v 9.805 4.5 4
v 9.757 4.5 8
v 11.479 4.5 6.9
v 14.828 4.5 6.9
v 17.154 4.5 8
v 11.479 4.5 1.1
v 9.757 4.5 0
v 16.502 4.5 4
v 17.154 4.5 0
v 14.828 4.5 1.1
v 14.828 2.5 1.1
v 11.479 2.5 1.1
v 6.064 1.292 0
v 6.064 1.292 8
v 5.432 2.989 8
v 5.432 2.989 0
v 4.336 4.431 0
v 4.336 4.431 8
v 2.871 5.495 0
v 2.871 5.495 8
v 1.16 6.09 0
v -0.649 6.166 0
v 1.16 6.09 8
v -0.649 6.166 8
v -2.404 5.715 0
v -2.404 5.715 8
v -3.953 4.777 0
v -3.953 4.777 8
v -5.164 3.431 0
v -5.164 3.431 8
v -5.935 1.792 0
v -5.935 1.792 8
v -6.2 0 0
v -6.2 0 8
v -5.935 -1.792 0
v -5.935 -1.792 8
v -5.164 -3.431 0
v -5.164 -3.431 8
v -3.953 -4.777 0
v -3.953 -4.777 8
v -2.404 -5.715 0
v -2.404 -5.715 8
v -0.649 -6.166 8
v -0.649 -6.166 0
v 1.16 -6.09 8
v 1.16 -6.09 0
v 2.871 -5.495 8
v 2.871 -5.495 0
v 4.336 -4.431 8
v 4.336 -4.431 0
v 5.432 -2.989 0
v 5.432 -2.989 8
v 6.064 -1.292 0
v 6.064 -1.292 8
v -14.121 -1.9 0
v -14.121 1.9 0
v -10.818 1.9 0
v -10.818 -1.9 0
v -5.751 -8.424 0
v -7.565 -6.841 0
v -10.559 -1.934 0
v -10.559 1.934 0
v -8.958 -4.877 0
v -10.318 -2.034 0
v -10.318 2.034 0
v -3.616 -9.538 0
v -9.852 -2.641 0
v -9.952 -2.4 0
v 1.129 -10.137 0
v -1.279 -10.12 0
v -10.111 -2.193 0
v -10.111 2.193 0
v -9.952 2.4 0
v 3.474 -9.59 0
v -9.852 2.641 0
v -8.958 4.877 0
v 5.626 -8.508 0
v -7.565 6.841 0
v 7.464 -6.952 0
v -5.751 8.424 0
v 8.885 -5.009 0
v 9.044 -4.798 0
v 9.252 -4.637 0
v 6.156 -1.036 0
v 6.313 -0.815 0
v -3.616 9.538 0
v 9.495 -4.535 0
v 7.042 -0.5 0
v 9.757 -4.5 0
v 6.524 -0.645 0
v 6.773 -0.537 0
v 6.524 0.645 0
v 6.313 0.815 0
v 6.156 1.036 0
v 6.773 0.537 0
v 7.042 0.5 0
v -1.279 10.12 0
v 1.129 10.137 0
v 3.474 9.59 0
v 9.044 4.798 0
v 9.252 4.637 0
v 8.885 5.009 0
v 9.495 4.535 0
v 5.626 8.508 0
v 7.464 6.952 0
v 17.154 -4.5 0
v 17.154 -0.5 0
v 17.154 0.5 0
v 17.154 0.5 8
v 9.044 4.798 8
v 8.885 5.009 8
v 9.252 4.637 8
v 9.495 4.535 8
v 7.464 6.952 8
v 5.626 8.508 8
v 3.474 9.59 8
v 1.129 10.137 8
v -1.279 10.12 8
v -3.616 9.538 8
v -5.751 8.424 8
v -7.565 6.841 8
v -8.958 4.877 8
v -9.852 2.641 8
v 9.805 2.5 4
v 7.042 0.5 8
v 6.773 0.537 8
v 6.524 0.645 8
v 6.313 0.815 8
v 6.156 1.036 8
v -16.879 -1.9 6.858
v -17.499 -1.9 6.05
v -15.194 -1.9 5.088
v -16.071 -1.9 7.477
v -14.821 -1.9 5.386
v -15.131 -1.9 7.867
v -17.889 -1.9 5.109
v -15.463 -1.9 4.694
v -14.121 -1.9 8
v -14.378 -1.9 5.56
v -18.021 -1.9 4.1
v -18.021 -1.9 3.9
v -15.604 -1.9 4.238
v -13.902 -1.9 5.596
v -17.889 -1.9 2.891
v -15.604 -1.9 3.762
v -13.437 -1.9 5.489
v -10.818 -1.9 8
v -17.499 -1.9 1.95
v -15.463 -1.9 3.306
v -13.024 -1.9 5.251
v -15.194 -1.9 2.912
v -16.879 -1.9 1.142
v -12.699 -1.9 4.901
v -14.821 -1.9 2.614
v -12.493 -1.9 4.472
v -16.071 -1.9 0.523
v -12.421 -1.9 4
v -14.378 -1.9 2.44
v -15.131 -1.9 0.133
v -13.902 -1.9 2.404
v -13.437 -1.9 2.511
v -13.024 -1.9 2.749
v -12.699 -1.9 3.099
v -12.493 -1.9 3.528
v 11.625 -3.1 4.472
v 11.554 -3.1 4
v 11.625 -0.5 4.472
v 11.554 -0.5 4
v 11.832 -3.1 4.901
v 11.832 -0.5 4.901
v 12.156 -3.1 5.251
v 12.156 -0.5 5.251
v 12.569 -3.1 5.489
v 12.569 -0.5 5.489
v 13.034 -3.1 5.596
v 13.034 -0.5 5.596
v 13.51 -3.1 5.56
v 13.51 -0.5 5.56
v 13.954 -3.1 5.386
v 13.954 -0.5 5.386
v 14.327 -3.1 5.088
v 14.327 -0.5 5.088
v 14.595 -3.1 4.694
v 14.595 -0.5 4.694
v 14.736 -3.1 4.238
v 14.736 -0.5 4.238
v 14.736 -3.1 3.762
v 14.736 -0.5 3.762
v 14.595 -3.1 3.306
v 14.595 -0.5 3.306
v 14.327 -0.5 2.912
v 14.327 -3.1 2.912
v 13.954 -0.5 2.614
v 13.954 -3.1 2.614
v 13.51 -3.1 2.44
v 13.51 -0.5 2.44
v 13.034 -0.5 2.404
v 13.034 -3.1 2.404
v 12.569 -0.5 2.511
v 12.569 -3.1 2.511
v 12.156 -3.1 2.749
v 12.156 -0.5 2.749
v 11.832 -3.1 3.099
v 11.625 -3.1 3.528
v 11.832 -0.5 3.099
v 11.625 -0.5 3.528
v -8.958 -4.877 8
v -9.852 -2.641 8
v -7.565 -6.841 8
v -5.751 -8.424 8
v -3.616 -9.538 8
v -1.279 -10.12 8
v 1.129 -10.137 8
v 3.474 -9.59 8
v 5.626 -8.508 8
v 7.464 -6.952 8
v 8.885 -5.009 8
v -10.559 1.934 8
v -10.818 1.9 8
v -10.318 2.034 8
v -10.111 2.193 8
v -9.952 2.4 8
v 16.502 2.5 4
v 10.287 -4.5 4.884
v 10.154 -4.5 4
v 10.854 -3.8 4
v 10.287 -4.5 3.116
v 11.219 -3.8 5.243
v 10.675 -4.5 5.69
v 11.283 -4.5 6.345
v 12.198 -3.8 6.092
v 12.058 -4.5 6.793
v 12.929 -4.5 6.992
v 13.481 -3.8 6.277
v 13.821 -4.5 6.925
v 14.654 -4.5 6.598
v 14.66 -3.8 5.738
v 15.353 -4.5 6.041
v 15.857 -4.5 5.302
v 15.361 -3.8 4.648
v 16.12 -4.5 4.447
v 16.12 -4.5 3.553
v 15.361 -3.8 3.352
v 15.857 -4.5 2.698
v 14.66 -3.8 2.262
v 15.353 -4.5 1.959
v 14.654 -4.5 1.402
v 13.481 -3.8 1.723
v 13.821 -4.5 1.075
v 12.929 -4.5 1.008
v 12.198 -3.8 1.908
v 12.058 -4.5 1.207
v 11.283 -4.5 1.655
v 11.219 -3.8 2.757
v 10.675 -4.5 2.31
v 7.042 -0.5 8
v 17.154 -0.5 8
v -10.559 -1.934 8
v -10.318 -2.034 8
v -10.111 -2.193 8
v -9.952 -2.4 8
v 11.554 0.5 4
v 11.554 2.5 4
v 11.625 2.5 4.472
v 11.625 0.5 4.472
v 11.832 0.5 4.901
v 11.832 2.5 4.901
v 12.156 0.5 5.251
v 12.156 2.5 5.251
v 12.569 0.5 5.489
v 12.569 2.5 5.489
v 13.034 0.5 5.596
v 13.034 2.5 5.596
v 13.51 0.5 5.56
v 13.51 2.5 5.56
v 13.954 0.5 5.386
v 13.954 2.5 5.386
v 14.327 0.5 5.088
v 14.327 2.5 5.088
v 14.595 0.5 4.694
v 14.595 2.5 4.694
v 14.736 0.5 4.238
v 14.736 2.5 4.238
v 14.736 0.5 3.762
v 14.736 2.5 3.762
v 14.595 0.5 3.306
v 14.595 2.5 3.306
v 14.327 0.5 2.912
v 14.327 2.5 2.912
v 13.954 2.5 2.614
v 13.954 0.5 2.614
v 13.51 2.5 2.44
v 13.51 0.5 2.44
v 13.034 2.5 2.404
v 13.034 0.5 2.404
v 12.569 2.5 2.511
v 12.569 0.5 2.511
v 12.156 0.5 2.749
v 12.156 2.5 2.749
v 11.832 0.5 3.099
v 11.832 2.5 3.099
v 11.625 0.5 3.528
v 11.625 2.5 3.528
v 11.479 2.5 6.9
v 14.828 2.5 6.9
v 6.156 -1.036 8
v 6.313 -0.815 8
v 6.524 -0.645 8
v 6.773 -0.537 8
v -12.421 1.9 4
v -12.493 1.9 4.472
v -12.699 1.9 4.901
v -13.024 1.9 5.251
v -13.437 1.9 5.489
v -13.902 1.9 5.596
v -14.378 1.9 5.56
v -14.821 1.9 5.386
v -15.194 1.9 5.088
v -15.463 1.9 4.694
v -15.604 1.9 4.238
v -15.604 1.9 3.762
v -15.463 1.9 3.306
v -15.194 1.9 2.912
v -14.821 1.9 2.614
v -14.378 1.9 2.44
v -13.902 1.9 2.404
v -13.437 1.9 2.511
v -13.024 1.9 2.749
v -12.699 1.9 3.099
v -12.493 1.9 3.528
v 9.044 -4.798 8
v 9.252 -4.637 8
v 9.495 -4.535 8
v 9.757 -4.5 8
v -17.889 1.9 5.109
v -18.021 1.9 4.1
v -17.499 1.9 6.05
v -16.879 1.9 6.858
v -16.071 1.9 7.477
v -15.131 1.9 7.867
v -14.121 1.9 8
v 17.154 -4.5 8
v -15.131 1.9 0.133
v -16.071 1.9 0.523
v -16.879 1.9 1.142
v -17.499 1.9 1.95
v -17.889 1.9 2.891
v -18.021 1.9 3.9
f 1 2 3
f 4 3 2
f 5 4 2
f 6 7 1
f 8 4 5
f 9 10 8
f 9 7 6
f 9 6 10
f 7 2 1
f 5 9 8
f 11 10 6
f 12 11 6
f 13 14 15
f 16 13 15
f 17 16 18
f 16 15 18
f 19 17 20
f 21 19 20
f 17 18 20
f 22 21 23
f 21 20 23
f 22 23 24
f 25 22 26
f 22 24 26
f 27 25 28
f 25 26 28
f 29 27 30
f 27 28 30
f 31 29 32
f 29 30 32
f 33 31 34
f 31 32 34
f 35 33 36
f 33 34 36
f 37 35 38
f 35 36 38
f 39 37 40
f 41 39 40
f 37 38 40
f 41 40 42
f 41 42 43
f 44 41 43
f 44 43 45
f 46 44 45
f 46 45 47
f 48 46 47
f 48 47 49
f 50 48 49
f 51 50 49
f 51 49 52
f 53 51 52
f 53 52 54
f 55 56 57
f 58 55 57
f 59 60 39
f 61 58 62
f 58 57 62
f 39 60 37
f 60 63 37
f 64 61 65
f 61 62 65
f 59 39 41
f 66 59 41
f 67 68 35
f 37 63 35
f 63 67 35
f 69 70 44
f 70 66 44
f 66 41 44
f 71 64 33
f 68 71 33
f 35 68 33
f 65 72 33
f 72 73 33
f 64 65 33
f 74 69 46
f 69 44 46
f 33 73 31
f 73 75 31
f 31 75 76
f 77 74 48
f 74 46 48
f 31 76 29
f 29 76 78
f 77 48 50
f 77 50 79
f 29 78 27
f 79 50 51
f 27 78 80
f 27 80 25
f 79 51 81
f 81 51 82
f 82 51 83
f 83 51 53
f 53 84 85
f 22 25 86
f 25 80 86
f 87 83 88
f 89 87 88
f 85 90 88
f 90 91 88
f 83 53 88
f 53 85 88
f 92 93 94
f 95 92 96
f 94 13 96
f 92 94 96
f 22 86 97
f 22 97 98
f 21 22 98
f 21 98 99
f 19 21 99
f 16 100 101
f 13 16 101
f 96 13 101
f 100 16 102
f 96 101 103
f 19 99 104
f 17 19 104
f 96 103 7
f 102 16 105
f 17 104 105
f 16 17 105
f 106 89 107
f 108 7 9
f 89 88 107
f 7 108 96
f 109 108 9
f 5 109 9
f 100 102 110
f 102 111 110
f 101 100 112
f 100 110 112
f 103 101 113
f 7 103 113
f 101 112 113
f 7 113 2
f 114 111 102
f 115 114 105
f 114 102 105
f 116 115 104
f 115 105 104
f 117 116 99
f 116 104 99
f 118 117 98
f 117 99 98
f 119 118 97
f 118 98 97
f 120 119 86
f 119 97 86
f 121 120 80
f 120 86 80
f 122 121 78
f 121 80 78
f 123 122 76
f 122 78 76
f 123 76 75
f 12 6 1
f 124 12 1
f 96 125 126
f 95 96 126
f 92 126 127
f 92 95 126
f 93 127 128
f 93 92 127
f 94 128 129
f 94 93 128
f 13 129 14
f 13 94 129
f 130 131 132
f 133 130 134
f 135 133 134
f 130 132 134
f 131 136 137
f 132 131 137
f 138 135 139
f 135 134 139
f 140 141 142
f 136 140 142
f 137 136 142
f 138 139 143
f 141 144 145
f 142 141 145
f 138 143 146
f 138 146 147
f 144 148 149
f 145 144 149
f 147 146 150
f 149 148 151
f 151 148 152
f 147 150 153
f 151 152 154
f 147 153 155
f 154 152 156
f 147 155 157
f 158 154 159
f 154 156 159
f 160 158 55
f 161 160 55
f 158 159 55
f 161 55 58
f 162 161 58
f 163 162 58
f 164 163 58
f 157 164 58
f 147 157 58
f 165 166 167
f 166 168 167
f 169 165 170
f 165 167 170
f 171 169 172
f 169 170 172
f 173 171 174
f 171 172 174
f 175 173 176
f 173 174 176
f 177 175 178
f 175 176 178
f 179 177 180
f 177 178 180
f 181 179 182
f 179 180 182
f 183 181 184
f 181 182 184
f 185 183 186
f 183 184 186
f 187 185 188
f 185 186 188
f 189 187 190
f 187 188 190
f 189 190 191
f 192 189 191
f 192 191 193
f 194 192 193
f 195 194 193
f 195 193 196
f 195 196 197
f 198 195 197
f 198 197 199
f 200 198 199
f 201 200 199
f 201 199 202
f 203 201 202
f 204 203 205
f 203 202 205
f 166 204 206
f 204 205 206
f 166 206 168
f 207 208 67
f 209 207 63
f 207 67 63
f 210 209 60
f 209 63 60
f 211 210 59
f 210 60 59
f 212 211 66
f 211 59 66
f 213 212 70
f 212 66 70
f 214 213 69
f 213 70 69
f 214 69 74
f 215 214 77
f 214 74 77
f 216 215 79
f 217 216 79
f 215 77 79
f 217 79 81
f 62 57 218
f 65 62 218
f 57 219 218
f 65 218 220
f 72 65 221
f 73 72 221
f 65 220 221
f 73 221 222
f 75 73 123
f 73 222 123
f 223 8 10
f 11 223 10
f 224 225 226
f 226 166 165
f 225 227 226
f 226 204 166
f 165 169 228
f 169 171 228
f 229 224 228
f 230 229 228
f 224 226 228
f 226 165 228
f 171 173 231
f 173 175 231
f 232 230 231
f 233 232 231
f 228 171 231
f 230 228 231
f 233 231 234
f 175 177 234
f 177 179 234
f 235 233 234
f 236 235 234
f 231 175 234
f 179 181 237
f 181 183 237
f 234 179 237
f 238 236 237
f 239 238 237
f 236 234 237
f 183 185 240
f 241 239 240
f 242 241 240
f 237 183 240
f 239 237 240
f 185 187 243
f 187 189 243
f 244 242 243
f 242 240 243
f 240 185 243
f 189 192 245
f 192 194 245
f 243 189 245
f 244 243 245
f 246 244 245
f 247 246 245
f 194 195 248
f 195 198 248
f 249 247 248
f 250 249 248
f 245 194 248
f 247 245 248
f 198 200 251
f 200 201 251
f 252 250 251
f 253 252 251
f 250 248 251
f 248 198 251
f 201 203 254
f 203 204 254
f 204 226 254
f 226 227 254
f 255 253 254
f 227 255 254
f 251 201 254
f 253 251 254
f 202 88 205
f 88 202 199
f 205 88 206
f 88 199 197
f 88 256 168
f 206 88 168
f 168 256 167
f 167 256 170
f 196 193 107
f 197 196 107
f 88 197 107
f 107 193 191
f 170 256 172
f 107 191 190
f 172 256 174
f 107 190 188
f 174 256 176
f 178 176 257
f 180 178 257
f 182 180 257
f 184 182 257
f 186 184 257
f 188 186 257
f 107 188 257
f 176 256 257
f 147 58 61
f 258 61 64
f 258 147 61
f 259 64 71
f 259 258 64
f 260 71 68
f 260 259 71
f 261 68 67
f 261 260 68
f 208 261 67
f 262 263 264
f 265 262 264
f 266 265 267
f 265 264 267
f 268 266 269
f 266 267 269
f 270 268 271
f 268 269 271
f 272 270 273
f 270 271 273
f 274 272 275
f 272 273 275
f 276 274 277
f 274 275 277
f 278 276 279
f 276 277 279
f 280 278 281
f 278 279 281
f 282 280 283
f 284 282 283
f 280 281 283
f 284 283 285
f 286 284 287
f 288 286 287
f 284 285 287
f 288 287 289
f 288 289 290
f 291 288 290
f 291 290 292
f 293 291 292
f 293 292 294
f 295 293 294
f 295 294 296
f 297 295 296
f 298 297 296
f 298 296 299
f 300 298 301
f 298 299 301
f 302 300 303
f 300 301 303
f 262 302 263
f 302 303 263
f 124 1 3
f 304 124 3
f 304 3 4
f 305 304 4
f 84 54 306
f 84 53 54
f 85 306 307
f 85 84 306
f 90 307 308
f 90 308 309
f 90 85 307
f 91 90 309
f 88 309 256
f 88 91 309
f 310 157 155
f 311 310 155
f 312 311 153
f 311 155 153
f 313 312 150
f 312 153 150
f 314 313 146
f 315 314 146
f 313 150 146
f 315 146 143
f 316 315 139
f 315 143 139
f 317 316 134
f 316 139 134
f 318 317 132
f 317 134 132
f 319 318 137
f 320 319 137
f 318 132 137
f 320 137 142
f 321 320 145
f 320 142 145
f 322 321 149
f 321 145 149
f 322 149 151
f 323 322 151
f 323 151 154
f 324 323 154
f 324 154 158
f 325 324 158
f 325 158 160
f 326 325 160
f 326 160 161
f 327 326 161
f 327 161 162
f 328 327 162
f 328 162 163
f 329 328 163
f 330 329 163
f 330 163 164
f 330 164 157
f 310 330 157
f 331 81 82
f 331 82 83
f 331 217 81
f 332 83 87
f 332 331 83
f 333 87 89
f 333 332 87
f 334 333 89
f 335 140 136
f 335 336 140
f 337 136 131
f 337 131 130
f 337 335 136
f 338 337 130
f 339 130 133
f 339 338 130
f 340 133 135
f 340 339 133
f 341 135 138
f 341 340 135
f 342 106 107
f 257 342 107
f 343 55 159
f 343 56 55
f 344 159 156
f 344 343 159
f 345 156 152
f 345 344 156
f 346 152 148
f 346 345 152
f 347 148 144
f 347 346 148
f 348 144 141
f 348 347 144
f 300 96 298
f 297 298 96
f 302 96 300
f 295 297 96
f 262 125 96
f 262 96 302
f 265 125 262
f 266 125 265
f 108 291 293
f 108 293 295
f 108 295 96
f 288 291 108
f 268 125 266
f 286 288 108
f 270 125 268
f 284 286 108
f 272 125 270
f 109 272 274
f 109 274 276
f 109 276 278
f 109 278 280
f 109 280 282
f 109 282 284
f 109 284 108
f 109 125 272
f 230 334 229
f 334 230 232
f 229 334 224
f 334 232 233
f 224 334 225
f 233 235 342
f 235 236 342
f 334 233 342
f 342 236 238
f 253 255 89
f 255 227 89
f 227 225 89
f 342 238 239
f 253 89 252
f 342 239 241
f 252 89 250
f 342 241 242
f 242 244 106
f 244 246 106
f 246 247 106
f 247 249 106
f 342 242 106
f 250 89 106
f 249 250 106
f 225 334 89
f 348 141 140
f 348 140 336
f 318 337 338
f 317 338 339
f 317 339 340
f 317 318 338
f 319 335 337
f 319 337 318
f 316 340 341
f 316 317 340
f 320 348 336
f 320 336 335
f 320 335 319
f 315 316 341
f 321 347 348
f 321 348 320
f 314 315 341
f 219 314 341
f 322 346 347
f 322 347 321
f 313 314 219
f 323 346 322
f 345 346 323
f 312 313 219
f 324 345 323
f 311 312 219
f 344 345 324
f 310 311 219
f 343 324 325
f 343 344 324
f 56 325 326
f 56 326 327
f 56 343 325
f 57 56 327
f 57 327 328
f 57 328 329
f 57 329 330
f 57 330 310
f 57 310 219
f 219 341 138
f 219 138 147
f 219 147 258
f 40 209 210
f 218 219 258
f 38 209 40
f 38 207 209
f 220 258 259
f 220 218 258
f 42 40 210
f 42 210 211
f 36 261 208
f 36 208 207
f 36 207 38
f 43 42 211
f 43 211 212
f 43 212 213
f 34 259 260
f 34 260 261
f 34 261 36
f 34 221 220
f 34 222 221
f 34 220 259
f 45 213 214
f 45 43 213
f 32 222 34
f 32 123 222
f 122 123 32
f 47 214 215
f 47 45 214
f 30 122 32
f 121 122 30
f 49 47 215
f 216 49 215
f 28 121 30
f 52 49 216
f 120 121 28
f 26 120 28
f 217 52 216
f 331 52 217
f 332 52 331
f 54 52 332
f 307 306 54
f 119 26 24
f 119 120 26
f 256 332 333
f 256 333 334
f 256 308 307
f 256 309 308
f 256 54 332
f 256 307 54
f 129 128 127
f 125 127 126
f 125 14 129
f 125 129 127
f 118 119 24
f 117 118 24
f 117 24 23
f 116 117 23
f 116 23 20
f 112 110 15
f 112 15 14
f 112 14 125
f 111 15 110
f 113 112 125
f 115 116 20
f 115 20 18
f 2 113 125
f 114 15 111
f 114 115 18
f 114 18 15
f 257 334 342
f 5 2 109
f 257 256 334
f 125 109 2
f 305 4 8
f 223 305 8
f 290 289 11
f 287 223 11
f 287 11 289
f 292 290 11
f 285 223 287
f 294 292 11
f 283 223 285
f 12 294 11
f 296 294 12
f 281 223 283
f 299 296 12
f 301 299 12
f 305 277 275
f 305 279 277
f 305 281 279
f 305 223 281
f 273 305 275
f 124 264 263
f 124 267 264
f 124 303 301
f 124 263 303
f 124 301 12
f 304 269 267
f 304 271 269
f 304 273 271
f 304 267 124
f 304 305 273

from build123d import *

# Parameters (mm, degrees)
SKETCH_R         = 10.2
PAD_DEPTH        = 8
SKETCH002_W      = 8
SKETCH002_H      = 3.8
PAD001_DEPTH     = 8
SKETCH003_W      = 8
SKETCH003_H      = 9
PAD002_DEPTH     = 8
POCKET_DEPTH     = 8.001
SKETCH005_R      = 1.6
POCKET001_DEPTH  = 12.101
HOLE_D           = 3.2
HOLE_CSINK_D     = 6
HOLE_CSINK_ANGLE = 90
POCKET003_DEPTH  = 2
FILLET_R         = 3.9
FILLET001_R      = 1


with BuildPart() as part:
    # Sketch → Pad (new body)
    with BuildSketch(Plane.XY):
        Circle(SKETCH_R)
    extrude(amount=PAD_DEPTH)

    # Sketch002 → Pad001 (join)
    with BuildSketch(Plane.XY):
        with Locations((-14.021477, 0)):
            Rectangle(SKETCH002_W, SKETCH002_H)
    extrude(amount=PAD001_DEPTH)

    # Sketch003 → Pad002 (join)
    with BuildSketch(Plane.XY):
        with Locations((13.153688, 0)):
            Rectangle(SKETCH003_W, SKETCH003_H)
    extrude(amount=PAD002_DEPTH)

    # Sketch004 (on Face10 of Pad002) → Pocket (cut, through all)
    with BuildSketch(Plane.XY.offset(8)):
        with BuildLine():
            ThreePointArc((6.179806, 0.5), (-6.2, 0), (6.179806, -0.5))
            Line((6.179806, -0.5), (17.153688, -0.5))
            Line((17.153688, -0.5), (17.153688, 0.5))
            Line((6.179806, 0.5), (17.153688, 0.5))
        make_face()
    extrude(amount=-POCKET_DEPTH, mode=Mode.SUBTRACT)

    # Sketch005 (on Face7 of Pocket) → Pocket001 (cut, through all)
    with BuildSketch(Plane.XZ.offset(1.9)):
        with Locations((-14.021477, 4)):
            Circle(SKETCH005_R)
    extrude(amount=-POCKET001_DEPTH, mode=Mode.SUBTRACT)

    # Hole (through all)
    with Locations(Plane.XZ.offset(4.5)):
        with Locations((13.153688, 4)):
            CounterSinkHole(HOLE_D / 2, HOLE_CSINK_D / 2, counter_sink_angle=HOLE_CSINK_ANGLE)

    # Sketch007 → Pocket003 (cut)
    with BuildSketch(Plane(origin=(0, 4.5, 0), x_dir=(-1, 0, 0), z_dir=(0, 1, 0))):
        Polygon((-9.805056, 4), (-11.479372, 6.9), (-14.828004, 6.9), (-16.502319, 4), (-14.828004, 1.1), (-11.479372, 1.1), align=None)
    extrude(amount=-POCKET003_DEPTH, mode=Mode.SUBTRACT)

    # Fillet
    fillet_edges = [part.edges().sort_by_distance(p)[0] for p in [
        (-18.021477, 0, 8),
        (-18.021477, 0, 0),
    ]]
    fillet(fillet_edges, radius=FILLET_R)

    # Fillet001
    fillet001_edges = [part.edges().sort_by_distance(p)[0] for p in [
        (9.153688, 4.5, 4),
        (9.153688, -4.5, 4),
        (-10.021477, -1.9, 4),
        (-10.021477, 1.9, 4),
        (6.179806, -0.5, 4),
        (6.179806, 0.5, 4),
    ]]
    fillet(fillet001_edges, radius=FILLET001_R)


solid = part.part
